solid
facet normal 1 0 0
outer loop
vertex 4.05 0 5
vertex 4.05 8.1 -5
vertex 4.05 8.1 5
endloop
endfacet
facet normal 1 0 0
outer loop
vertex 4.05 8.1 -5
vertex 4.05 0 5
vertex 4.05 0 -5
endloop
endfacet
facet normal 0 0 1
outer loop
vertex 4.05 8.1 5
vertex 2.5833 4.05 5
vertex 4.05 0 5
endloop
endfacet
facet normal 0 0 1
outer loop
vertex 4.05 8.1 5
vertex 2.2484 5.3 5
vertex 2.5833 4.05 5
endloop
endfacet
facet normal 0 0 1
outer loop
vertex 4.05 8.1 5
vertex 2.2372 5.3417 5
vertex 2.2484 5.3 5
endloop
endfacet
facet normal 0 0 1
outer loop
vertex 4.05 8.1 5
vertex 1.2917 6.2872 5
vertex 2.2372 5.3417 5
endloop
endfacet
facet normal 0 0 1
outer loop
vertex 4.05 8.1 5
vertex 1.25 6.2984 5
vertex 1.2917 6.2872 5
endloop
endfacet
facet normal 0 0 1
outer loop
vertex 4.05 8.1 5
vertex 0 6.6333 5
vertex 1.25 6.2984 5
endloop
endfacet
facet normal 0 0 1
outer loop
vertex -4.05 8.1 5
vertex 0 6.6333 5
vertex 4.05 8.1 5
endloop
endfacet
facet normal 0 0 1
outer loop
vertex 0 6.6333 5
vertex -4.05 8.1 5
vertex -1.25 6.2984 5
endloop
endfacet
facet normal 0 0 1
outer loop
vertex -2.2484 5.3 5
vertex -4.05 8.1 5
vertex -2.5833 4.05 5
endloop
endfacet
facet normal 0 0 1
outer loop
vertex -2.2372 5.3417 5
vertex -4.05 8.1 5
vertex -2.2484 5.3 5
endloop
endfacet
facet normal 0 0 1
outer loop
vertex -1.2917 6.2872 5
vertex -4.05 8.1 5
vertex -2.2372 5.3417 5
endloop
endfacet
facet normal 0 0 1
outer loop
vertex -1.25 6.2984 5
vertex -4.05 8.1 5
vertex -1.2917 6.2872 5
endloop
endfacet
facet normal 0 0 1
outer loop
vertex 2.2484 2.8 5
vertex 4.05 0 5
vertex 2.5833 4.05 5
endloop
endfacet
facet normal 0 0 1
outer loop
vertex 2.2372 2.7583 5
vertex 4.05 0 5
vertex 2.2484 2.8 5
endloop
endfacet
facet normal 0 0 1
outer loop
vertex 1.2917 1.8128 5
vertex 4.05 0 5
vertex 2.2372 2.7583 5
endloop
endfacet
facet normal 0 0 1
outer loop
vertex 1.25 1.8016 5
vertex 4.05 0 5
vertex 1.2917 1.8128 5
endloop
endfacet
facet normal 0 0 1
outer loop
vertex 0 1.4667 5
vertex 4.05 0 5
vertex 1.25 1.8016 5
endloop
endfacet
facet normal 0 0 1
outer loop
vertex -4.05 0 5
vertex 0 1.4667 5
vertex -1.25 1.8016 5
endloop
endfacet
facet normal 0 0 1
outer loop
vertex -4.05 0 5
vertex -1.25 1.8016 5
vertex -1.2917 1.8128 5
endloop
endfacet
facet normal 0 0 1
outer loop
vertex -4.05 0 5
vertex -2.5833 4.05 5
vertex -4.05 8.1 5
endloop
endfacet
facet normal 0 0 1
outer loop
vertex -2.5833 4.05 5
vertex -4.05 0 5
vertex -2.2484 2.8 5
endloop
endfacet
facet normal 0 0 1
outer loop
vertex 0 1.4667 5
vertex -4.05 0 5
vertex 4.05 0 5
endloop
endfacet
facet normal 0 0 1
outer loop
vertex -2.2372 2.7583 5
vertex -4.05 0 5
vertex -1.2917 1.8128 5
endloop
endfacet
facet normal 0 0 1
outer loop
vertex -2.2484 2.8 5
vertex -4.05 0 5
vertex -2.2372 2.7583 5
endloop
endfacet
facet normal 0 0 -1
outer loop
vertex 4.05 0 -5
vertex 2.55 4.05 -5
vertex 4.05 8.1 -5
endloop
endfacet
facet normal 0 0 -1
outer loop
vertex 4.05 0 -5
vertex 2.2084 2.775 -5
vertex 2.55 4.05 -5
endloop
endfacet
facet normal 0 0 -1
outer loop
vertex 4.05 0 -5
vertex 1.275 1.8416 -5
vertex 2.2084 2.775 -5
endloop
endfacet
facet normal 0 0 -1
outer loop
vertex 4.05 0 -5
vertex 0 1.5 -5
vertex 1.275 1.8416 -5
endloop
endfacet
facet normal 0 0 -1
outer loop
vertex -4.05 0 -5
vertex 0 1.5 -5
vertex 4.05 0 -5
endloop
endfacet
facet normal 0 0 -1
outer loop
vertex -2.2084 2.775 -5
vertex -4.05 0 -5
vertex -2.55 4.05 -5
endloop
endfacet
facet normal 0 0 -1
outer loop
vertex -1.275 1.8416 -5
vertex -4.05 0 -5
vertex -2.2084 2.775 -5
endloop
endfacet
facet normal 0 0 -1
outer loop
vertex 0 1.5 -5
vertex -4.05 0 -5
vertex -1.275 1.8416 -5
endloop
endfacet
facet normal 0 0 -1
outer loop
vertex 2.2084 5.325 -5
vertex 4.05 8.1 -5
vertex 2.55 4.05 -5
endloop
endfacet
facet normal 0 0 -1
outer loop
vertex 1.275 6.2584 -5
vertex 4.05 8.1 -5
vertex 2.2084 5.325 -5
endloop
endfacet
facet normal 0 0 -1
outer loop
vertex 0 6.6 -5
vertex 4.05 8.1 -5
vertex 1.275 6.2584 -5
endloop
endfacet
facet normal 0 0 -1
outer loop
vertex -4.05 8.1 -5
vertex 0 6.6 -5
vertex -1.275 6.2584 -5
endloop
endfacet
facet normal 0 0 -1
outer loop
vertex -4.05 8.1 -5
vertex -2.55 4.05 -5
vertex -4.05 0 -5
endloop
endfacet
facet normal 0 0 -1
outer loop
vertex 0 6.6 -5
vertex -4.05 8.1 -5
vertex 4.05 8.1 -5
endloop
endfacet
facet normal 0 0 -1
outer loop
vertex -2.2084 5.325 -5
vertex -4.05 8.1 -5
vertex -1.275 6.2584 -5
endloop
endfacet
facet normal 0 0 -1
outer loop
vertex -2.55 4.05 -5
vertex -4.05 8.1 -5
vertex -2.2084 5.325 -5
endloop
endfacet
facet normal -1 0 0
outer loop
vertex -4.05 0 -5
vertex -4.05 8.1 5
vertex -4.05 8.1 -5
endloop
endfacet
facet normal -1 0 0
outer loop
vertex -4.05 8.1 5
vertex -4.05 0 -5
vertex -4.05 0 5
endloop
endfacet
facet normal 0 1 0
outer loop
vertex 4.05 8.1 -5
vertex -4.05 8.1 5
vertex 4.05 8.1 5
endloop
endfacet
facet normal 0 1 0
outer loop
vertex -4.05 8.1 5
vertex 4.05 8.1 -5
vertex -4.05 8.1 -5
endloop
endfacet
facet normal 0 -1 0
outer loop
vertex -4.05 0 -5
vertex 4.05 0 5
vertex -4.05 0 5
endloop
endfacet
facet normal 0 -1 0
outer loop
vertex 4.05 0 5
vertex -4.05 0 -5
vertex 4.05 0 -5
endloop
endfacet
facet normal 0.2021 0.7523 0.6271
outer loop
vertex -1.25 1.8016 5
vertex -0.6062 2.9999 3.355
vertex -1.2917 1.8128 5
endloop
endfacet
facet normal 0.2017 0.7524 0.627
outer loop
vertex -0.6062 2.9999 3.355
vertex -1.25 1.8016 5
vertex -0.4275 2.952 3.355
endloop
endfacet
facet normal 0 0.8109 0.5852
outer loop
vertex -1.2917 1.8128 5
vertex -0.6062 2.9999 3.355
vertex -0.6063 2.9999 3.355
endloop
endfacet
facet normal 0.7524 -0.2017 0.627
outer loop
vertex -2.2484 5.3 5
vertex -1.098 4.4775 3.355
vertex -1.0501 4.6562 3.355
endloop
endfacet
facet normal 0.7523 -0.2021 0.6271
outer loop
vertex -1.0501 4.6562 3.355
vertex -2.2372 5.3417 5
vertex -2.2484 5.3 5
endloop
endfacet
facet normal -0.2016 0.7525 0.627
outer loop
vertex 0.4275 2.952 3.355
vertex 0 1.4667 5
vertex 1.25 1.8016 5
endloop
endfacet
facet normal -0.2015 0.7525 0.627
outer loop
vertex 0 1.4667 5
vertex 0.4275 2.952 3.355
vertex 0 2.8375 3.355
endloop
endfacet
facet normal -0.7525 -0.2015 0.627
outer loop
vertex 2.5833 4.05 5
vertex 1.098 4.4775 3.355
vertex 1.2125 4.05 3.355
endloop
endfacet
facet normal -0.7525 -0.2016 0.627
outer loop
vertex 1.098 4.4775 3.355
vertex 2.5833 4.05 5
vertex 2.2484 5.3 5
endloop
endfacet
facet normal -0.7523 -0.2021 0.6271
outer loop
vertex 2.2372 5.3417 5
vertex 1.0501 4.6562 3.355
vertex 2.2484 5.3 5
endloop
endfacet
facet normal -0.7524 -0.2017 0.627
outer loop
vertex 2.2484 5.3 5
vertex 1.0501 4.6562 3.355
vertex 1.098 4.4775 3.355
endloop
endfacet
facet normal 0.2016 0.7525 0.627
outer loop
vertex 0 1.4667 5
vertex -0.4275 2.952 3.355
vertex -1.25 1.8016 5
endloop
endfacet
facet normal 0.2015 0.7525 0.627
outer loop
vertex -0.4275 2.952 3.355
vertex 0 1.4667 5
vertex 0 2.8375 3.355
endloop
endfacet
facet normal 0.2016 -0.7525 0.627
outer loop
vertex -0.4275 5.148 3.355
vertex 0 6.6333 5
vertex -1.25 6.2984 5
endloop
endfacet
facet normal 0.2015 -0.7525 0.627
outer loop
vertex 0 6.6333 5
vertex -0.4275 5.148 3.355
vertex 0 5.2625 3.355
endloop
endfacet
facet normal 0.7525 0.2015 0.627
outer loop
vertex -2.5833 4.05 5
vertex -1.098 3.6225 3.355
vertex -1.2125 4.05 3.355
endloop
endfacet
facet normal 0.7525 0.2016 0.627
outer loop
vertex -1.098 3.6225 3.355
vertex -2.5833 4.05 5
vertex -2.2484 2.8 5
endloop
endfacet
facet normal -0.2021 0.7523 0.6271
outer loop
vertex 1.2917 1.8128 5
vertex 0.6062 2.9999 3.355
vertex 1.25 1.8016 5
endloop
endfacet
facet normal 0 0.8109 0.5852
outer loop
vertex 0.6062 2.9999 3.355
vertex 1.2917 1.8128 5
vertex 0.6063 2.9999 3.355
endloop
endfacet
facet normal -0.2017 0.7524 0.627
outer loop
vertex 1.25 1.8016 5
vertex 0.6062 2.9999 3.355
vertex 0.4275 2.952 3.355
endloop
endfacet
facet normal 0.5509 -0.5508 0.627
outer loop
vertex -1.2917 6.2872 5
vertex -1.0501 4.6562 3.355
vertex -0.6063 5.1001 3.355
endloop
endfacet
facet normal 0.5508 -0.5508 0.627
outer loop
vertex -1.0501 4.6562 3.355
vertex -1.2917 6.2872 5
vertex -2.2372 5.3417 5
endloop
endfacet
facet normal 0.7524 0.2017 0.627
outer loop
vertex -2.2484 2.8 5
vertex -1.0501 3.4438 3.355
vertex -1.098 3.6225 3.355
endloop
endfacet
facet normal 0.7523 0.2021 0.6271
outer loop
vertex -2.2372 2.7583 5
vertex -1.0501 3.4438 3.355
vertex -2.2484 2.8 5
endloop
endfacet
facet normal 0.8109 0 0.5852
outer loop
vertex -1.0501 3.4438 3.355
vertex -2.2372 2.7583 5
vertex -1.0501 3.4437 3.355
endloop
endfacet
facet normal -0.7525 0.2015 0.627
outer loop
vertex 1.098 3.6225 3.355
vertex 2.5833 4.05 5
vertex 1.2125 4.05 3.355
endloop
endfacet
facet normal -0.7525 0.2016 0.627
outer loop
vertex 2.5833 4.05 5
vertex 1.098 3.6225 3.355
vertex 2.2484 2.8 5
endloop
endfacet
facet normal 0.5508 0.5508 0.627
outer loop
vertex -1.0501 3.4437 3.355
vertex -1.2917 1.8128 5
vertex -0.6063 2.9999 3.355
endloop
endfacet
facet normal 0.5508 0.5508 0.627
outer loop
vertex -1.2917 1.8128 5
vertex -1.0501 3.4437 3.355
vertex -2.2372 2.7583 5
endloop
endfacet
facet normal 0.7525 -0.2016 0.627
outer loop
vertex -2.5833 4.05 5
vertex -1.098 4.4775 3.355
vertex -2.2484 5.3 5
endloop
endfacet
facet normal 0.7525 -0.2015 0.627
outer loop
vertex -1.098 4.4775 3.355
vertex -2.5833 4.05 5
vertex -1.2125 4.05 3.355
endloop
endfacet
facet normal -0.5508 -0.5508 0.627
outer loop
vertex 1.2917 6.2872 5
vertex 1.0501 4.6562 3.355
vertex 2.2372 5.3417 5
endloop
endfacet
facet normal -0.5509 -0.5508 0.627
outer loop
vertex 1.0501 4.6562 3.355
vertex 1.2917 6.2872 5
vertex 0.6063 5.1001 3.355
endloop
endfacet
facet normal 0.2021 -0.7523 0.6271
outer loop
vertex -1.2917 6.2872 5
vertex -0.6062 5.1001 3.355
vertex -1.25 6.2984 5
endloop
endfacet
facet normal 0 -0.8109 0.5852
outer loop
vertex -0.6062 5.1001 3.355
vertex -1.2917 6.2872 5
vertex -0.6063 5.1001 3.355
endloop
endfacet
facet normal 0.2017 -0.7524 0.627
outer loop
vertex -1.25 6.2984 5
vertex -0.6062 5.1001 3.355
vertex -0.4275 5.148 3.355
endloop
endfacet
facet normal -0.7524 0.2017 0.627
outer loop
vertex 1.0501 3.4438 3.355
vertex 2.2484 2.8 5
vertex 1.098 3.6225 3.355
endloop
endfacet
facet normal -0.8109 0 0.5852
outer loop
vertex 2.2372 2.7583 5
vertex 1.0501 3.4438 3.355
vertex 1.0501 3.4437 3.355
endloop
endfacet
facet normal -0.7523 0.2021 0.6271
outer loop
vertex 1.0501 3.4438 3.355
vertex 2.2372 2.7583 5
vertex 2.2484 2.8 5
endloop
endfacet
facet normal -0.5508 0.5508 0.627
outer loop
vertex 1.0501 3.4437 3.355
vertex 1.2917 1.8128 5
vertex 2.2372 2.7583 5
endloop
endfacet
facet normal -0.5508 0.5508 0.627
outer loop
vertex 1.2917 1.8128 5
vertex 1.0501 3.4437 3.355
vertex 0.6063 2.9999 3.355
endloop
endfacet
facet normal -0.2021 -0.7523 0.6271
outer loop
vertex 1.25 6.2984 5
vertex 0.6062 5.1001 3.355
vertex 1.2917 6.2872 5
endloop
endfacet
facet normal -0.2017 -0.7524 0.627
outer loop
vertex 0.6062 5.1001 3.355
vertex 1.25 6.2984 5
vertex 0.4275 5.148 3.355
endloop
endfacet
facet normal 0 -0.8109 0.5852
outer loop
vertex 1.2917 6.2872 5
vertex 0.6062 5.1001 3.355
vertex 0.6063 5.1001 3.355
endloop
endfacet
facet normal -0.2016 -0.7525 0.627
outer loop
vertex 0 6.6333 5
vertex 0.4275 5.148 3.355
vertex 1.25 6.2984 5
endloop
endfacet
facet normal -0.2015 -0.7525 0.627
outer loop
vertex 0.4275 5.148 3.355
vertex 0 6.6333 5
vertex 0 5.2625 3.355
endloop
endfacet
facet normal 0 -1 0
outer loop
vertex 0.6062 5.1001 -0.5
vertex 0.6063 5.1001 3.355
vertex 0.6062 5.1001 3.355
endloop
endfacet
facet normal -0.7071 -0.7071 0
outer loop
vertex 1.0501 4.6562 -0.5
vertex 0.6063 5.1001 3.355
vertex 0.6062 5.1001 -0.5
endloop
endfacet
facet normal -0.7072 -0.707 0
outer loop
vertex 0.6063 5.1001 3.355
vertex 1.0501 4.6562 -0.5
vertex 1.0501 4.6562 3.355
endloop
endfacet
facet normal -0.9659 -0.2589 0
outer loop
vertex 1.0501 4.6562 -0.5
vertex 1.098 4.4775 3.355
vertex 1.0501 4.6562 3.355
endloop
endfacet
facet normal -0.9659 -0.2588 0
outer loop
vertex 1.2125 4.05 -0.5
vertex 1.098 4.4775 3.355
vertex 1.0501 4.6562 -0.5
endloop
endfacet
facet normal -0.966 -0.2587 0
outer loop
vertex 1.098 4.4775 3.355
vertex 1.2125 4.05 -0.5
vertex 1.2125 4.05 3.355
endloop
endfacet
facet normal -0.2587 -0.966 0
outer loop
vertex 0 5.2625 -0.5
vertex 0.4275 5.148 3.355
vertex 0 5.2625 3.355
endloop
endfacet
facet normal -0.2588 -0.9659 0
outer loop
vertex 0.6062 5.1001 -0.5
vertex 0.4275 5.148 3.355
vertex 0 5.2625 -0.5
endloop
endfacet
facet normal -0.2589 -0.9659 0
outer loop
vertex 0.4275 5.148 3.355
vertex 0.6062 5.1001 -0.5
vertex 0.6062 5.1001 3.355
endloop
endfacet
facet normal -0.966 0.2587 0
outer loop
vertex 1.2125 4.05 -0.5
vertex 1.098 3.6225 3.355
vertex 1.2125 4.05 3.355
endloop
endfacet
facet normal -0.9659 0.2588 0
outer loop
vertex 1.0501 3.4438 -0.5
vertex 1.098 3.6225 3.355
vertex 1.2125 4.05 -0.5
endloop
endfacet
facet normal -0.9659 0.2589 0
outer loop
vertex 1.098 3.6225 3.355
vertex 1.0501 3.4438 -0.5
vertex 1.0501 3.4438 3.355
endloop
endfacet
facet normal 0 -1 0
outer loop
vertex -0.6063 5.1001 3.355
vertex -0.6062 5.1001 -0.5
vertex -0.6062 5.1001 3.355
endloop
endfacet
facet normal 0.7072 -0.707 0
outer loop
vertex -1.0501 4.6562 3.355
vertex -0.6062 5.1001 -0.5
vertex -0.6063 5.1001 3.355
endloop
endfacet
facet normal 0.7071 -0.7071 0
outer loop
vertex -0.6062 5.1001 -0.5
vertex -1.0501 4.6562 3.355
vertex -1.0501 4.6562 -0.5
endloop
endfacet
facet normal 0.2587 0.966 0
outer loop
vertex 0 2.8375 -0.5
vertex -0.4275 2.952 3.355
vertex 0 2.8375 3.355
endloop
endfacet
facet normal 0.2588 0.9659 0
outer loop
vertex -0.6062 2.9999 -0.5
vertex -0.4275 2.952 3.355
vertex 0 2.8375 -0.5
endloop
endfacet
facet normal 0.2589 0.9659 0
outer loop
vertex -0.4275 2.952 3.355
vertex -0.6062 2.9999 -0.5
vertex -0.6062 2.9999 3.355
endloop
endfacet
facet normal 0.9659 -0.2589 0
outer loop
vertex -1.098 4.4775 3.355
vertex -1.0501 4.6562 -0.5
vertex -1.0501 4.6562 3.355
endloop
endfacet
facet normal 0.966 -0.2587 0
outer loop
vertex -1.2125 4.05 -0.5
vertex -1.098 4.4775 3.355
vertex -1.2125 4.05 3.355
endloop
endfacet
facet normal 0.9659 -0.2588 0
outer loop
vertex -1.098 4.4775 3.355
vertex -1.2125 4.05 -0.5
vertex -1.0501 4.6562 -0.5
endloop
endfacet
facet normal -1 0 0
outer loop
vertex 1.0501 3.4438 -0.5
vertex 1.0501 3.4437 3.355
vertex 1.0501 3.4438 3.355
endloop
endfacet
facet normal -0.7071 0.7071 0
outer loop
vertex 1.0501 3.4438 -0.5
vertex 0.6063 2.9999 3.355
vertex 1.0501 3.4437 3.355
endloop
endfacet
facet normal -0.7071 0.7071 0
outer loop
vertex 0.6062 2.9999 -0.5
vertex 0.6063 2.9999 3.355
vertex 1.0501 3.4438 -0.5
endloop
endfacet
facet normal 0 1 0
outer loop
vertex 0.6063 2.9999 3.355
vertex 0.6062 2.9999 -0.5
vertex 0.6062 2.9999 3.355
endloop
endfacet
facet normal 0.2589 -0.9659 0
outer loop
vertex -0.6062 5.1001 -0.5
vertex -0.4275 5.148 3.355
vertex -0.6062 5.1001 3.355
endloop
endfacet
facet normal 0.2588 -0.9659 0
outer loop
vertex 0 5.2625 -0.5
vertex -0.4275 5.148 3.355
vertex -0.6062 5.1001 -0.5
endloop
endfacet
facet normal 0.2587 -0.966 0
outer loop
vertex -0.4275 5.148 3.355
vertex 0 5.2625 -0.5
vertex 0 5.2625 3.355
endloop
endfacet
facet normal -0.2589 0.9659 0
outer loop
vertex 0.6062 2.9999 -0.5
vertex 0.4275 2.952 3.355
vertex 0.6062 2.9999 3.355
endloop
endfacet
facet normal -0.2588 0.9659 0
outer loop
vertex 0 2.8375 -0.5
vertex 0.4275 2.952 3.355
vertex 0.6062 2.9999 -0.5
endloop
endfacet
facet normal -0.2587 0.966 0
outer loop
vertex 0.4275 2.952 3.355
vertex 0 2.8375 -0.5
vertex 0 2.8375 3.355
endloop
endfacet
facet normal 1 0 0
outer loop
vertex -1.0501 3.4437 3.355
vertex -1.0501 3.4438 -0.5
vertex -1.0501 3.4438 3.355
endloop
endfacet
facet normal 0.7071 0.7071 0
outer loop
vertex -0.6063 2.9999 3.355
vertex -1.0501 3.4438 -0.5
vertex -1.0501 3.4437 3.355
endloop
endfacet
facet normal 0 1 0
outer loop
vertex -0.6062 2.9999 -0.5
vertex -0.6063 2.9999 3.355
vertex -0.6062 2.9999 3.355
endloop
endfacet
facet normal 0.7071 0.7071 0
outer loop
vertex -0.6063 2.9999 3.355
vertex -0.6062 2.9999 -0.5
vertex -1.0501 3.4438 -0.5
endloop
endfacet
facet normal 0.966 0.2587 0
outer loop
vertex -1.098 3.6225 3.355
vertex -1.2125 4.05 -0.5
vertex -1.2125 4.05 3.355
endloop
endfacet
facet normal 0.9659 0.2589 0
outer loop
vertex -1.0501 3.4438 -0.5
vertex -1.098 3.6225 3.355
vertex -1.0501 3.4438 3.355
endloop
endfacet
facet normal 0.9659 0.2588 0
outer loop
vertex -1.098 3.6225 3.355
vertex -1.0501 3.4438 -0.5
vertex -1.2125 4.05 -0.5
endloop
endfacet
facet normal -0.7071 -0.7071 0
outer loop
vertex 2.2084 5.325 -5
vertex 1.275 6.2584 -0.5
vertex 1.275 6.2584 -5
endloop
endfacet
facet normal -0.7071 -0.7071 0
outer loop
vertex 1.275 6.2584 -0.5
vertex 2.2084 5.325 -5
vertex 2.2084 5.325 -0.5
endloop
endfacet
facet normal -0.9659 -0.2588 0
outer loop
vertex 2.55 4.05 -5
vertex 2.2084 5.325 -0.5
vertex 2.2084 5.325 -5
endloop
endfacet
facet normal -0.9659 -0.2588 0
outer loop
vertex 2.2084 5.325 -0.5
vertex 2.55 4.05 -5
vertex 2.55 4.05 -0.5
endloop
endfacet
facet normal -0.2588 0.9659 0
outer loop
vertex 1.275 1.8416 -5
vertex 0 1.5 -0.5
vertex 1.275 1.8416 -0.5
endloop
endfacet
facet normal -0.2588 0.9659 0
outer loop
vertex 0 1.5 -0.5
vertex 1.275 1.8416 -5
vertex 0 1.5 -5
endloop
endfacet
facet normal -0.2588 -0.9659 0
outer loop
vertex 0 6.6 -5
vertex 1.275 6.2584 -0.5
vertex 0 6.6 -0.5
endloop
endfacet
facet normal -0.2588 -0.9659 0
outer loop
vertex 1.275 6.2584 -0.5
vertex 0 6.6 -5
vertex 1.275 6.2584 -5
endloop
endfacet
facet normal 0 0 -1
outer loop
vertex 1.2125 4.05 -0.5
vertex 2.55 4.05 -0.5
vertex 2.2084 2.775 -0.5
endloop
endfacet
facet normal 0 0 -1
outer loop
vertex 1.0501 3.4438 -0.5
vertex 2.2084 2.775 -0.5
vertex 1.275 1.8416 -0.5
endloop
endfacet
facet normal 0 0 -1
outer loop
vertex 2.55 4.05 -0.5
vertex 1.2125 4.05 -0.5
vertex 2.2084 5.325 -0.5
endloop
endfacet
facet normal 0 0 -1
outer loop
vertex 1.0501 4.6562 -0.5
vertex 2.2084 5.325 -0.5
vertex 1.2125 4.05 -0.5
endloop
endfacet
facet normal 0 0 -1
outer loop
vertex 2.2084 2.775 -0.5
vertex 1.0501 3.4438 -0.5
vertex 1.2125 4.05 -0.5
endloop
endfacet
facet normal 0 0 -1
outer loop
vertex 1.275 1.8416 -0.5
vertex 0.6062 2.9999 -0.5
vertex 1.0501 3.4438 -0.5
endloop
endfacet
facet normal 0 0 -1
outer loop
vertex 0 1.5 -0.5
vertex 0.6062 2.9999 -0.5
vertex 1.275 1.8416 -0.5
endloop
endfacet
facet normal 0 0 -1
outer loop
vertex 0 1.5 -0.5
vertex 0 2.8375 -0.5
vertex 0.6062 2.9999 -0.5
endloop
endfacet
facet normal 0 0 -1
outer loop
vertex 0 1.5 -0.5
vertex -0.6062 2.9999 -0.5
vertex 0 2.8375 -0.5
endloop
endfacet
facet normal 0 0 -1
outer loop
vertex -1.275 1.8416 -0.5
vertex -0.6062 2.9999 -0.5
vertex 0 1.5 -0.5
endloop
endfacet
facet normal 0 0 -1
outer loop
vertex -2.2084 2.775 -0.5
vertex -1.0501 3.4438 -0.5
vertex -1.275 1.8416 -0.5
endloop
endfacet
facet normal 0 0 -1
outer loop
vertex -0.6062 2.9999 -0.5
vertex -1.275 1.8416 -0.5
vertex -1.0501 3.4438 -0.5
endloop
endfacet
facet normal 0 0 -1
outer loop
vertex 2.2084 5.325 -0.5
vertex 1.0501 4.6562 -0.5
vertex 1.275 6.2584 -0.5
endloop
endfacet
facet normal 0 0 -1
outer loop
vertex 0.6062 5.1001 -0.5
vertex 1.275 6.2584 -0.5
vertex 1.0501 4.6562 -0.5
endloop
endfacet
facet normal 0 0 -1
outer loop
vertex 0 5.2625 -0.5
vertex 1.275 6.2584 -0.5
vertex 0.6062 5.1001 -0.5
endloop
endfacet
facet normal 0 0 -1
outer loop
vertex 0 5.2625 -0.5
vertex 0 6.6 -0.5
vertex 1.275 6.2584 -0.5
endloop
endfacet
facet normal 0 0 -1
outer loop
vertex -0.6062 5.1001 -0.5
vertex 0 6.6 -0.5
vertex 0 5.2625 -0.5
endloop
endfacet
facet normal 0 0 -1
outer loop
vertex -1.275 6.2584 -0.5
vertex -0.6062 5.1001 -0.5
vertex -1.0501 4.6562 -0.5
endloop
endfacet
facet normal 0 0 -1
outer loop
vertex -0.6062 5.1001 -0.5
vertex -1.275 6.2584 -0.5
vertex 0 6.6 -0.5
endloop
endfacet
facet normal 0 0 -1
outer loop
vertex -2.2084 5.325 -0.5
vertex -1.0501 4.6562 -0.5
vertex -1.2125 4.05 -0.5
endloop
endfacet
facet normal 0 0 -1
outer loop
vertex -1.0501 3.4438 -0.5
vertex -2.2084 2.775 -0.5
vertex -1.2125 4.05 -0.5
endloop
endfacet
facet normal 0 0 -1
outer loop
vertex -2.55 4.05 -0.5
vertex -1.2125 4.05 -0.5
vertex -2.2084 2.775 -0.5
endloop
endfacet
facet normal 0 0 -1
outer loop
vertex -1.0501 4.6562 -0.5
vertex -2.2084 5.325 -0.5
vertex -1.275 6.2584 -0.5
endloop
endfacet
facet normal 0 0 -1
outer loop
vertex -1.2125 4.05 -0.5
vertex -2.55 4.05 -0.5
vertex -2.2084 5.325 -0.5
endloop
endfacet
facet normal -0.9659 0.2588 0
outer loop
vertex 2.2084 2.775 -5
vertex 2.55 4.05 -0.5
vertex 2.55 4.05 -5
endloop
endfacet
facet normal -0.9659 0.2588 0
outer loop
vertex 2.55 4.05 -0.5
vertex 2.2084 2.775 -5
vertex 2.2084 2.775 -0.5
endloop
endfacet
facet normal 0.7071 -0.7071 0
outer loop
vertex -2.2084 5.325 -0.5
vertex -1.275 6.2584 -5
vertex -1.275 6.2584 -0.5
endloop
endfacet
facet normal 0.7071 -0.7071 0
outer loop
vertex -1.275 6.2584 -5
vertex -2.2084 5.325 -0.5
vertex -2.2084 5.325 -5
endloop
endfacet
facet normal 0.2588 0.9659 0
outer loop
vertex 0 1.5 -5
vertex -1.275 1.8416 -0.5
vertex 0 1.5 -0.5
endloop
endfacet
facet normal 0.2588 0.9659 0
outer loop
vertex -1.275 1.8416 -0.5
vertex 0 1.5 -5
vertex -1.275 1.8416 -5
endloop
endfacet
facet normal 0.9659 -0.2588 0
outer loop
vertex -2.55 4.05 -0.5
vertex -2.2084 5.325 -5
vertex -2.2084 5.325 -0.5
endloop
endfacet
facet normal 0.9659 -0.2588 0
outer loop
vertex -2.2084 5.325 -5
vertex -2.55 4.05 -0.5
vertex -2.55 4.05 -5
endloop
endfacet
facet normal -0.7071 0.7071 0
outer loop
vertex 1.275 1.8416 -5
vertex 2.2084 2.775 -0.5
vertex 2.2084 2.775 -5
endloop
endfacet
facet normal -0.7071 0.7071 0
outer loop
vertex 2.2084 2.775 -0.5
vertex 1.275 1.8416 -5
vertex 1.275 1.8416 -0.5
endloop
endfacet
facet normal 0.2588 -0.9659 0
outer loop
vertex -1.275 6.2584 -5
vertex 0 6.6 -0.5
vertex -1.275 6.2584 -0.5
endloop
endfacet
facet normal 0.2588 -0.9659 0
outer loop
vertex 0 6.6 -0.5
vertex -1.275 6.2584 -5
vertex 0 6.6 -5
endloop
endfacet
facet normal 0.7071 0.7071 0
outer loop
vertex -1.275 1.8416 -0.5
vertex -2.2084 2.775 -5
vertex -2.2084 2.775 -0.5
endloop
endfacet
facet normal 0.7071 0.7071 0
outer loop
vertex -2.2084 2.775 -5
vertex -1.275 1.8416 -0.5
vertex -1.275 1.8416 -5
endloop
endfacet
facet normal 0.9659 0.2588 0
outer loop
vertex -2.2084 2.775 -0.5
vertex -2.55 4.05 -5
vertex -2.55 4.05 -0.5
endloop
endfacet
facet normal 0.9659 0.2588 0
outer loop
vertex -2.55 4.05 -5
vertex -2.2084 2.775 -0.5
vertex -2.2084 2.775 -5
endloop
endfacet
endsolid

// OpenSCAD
// based on: https://github.com/jcrocholl/kossel/blob/master/extruder.scad

function filament_guide_pushfit_hole_diameter(pushfit_hole_diameter, epsilon) =
	pushfit_hole_diameter + 2*epsilon;

function filament_guide_path_diameter(filament_diameter,
		filament_play_factor, epsilon) =
	filament_diameter * filament_play_factor + 2*epsilon;

function filament_guide_width(pushfit_hole_diameter, filament_diameter,
		filament_play_factor, epsilon, thickness) =
	let(fpd = filament_guide_path_diameter(filament_diameter,
		filament_play_factor, epsilon))
	let(phd = filament_guide_pushfit_hole_diameter(pushfit_hole_diameter,
		epsilon))
	max(fpd, phd) + 2*thickness;

module filament_guide(length = 10,
		filament_diameter = 1.75,
		filament_play_factor = 1.1,
		pushfit_hole_diameter = 4.6,
		thickness = 1.5,
		epsilon = 0.25) {
	width = filament_guide_width(pushfit_hole_diameter, filament_diameter,
		filament_play_factor, epsilon, thickness);

	// put on zero-line on y axis for attaching to things
	translate([0, width/2, 0])
		difference() {
			//pushfit/pneufit mount
			cube([width, width, length], center=true, $fn=8);

			//filament path chamfer
			translate([0, 0, length/2 - 1]) #
				cylinder(h = 3, r1 = 0.5, r2 = 3,
				center = true, $fn = 12);

			//filament path
			#cylinder(h = length + 1,
				d = filament_guide_path_diameter(filament_diameter,
					filament_play_factor, epsilon),
				center = true, $fn=12);

			//pushfit/pneufit mount
			translate([0, 0, -length/2 + 2]) #
				cylinder(d = filament_guide_pushfit_hole_diameter(pushfit_hole_diameter,
						epsilon),
					h = 5, center = true, $fn=12);
		}
}

filament_guide();
